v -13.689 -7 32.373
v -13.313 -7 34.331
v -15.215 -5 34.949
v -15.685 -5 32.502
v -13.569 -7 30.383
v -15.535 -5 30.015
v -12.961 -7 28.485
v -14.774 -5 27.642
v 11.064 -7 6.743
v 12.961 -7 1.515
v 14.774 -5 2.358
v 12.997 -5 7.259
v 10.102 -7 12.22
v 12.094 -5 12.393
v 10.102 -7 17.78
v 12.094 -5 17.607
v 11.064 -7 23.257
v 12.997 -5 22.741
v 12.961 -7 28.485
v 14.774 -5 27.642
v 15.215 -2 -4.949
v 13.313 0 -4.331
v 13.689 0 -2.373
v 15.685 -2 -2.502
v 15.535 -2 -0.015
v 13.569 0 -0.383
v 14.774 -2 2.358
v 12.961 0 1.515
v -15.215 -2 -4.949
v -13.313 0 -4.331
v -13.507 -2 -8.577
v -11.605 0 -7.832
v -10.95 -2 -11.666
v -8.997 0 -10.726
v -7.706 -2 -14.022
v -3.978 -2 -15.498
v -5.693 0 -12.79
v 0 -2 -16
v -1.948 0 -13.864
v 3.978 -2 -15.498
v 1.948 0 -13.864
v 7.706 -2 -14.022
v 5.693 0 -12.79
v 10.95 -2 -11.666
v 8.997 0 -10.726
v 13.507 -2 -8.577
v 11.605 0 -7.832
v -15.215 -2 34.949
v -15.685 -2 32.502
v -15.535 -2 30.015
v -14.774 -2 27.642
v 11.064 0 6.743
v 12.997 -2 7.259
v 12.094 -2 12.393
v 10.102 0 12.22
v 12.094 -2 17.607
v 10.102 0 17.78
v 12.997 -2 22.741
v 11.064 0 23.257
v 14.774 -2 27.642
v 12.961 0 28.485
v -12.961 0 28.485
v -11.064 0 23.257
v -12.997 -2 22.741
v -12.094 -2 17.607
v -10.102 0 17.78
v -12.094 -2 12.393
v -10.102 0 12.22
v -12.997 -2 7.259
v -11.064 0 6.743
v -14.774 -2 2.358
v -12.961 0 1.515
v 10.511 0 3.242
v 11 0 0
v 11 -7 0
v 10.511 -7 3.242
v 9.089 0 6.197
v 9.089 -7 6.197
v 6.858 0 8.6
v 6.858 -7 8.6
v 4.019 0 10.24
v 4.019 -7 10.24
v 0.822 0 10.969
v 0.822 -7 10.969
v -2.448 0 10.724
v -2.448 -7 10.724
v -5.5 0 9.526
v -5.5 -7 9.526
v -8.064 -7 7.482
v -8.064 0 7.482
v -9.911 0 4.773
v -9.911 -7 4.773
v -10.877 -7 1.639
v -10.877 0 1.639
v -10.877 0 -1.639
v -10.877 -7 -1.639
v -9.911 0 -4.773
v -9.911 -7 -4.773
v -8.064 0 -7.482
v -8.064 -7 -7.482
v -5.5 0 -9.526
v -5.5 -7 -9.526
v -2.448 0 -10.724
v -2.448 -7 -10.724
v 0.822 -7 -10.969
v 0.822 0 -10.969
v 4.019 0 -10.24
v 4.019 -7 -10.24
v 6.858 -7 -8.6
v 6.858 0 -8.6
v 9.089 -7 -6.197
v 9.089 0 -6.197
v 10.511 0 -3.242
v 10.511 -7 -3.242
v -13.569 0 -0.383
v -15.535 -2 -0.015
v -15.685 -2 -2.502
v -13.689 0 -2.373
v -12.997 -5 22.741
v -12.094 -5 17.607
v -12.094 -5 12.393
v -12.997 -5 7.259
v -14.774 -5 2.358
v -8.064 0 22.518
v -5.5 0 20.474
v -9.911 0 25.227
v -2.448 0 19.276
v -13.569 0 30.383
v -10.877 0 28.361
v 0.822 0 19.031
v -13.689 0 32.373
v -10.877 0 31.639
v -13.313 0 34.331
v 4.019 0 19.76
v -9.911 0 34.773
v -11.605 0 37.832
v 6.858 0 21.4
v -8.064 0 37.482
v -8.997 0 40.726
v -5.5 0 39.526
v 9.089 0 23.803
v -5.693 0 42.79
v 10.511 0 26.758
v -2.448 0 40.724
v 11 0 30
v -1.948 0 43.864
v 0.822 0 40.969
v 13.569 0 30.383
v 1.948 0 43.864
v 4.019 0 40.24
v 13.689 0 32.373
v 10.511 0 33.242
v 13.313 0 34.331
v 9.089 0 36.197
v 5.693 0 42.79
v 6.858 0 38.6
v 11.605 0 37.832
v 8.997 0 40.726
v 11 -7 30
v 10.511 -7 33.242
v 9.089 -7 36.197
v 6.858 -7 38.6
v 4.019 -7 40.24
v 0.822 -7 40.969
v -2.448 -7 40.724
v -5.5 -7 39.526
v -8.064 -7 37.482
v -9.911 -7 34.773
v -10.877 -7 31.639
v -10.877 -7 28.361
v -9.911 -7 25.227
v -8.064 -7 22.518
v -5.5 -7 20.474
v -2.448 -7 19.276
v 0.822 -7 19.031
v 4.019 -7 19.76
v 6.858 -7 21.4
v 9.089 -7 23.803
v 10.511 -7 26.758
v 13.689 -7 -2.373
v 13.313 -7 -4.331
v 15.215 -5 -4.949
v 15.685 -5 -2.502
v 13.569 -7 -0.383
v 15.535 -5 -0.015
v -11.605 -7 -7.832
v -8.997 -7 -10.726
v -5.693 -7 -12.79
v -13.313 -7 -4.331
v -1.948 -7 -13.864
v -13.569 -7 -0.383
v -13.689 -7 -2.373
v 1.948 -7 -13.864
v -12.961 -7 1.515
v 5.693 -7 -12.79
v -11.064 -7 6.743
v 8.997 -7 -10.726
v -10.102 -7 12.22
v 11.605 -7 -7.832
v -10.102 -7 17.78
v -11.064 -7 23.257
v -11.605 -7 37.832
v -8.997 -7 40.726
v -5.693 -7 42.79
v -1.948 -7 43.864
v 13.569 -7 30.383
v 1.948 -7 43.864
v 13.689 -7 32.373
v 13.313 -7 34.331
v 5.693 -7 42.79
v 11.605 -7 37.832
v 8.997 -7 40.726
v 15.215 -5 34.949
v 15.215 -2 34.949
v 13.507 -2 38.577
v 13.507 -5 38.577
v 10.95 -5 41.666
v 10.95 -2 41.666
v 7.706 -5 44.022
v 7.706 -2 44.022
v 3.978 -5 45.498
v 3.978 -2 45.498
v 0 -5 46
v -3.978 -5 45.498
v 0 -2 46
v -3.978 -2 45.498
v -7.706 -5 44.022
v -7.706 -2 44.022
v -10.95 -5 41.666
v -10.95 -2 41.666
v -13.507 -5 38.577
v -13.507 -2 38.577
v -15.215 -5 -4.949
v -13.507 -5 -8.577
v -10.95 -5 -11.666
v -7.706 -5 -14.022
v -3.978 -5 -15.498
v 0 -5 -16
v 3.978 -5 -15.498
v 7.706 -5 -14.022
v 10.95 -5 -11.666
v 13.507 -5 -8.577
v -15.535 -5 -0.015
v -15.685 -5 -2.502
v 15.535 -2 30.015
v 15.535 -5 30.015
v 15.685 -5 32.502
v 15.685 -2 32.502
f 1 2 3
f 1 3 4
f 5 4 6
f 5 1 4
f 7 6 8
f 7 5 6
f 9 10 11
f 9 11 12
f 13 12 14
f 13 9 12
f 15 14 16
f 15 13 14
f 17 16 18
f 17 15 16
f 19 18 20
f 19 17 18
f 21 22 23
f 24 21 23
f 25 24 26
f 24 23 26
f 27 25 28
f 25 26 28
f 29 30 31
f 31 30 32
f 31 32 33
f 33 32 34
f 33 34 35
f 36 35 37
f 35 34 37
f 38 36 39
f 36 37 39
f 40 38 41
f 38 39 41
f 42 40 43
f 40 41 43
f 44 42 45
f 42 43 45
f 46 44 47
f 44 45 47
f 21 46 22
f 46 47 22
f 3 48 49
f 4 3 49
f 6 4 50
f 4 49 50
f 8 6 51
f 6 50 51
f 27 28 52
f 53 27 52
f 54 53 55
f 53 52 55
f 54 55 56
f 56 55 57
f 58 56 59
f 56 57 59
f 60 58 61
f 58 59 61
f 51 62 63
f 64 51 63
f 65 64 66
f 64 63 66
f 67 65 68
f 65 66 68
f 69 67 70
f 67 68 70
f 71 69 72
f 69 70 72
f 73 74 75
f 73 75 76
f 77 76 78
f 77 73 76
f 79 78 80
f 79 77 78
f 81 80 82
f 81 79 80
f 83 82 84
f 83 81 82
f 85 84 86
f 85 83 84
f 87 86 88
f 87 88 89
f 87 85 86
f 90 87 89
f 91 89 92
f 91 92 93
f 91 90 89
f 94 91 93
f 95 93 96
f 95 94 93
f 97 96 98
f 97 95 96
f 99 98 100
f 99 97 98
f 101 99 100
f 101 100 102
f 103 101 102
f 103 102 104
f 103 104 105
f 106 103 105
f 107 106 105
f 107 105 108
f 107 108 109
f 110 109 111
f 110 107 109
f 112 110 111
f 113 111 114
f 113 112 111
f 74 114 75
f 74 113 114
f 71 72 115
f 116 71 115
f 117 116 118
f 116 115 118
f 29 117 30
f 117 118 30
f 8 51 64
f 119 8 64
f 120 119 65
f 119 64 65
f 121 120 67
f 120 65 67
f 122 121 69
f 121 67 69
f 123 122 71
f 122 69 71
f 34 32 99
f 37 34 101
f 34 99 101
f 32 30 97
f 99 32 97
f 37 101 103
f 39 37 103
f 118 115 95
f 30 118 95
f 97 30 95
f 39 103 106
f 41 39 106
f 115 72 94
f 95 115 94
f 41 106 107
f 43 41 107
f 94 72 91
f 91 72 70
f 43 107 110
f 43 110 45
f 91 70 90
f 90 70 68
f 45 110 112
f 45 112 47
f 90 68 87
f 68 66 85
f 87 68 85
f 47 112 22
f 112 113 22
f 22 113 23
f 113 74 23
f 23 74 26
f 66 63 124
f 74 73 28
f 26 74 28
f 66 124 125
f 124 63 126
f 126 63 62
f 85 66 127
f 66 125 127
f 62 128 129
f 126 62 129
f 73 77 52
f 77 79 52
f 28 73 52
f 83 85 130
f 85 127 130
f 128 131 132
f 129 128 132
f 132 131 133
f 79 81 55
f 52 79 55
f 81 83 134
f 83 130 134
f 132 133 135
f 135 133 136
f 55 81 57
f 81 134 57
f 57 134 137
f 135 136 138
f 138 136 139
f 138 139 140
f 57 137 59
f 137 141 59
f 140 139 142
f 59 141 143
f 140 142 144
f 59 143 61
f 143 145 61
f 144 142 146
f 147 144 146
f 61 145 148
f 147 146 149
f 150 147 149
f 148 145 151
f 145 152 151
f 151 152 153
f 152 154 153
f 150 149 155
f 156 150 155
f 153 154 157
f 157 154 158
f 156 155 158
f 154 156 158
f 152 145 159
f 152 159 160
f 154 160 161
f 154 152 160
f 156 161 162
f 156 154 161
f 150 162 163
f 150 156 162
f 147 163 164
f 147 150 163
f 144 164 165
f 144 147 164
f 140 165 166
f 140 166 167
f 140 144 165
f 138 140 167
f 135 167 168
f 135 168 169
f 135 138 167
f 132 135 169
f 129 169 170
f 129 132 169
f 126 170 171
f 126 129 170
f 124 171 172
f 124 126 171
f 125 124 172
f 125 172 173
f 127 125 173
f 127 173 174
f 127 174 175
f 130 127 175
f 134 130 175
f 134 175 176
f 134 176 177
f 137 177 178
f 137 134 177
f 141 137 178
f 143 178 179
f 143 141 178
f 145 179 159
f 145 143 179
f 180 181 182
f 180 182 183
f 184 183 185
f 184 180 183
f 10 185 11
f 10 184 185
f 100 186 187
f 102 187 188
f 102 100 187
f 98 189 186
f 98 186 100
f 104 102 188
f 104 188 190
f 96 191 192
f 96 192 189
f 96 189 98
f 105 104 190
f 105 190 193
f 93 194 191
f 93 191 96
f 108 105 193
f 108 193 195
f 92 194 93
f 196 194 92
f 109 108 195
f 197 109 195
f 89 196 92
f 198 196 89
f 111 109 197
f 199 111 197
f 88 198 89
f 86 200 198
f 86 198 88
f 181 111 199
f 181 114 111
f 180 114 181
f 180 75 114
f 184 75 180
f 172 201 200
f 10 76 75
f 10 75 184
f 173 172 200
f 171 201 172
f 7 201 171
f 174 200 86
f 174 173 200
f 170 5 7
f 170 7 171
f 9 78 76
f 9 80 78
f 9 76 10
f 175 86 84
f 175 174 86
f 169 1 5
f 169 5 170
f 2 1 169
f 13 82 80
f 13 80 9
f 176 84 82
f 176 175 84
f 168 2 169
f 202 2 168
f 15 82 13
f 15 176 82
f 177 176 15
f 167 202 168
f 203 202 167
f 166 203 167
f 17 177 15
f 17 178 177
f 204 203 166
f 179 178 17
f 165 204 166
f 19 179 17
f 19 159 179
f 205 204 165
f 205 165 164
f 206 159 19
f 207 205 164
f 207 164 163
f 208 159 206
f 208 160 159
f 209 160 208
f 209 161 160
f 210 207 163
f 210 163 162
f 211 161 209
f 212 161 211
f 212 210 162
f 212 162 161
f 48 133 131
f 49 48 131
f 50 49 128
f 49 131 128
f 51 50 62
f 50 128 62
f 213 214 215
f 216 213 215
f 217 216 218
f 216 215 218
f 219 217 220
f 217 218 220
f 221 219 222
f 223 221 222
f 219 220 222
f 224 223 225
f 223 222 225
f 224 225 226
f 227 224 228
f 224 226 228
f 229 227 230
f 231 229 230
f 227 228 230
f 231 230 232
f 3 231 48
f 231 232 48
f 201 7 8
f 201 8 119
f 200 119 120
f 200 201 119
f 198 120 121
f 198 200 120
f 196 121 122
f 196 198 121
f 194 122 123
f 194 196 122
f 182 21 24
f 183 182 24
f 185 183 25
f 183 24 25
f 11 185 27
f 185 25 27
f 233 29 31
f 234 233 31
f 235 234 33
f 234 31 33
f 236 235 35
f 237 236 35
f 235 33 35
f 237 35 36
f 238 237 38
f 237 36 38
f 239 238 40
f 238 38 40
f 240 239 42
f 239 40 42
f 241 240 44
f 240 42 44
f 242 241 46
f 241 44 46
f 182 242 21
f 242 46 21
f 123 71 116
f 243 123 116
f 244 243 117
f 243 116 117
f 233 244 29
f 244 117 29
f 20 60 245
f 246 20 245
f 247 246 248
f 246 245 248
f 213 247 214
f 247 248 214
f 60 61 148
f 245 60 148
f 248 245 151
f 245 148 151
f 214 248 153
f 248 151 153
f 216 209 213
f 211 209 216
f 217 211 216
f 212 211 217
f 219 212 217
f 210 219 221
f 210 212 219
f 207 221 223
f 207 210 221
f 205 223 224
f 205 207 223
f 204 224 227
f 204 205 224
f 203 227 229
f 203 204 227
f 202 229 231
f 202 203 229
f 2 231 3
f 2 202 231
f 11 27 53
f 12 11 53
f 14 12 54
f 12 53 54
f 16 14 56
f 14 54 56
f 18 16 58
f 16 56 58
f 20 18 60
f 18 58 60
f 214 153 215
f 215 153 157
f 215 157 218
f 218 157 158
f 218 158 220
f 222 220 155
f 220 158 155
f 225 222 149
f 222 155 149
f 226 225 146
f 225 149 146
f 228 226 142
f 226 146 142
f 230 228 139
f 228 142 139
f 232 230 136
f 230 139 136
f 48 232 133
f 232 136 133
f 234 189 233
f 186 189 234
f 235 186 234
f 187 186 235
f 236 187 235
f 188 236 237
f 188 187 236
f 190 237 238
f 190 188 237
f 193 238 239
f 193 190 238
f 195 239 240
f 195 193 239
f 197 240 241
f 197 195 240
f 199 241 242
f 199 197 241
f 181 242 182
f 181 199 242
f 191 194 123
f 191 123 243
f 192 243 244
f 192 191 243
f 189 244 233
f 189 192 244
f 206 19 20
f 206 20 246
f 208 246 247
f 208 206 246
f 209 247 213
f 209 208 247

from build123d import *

# Parameters (mm, degrees)
F0_R     = 11
F1_DEPTH = 7
F2_SIZE  = 2


with BuildPart() as f1:
    # F0 (on Front) → F1 (new body)
    with BuildSketch(Plane.XZ):
        with BuildLine():
            ThreePointArc((14.774496, 27.641957), (15.687594, 31.253782), (15.215308, 34.949181))
            ThreePointArc((15.215308, 34.949181), (0, 46), (-15.215308, 34.949181))
            ThreePointArc((-15.215308, 34.949181), (-15.687594, 31.253782), (-14.774496, 27.641957))
            ThreePointArc((-14.774496, 27.641957), (-11.980762, 15), (-14.774496, 2.358043))
            ThreePointArc((-14.774496, 2.358043), (-15.687594, -1.253782), (-15.215308, -4.949181))
            ThreePointArc((-15.215308, -4.949181), (0, -16), (15.215308, -4.949181))
            ThreePointArc((15.215308, -4.949181), (15.687594, -1.253782), (14.774496, 2.358043))
            ThreePointArc((14.774496, 2.358043), (11.980762, 15), (14.774496, 27.641957))
        make_face()
        Circle(F0_R, mode=Mode.SUBTRACT)
        with Locations((0, 30)):
            Circle(F0_R, mode=Mode.SUBTRACT)
    extrude(amount=F1_DEPTH)

    # F2
    f2_edges = [f1.edges().sort_by_distance(p)[0] for p in [
        (0, -7, 46),
        (0, 0, 46),
    ]]
    chamfer(f2_edges, length=F2_SIZE)


solid = f1.part
